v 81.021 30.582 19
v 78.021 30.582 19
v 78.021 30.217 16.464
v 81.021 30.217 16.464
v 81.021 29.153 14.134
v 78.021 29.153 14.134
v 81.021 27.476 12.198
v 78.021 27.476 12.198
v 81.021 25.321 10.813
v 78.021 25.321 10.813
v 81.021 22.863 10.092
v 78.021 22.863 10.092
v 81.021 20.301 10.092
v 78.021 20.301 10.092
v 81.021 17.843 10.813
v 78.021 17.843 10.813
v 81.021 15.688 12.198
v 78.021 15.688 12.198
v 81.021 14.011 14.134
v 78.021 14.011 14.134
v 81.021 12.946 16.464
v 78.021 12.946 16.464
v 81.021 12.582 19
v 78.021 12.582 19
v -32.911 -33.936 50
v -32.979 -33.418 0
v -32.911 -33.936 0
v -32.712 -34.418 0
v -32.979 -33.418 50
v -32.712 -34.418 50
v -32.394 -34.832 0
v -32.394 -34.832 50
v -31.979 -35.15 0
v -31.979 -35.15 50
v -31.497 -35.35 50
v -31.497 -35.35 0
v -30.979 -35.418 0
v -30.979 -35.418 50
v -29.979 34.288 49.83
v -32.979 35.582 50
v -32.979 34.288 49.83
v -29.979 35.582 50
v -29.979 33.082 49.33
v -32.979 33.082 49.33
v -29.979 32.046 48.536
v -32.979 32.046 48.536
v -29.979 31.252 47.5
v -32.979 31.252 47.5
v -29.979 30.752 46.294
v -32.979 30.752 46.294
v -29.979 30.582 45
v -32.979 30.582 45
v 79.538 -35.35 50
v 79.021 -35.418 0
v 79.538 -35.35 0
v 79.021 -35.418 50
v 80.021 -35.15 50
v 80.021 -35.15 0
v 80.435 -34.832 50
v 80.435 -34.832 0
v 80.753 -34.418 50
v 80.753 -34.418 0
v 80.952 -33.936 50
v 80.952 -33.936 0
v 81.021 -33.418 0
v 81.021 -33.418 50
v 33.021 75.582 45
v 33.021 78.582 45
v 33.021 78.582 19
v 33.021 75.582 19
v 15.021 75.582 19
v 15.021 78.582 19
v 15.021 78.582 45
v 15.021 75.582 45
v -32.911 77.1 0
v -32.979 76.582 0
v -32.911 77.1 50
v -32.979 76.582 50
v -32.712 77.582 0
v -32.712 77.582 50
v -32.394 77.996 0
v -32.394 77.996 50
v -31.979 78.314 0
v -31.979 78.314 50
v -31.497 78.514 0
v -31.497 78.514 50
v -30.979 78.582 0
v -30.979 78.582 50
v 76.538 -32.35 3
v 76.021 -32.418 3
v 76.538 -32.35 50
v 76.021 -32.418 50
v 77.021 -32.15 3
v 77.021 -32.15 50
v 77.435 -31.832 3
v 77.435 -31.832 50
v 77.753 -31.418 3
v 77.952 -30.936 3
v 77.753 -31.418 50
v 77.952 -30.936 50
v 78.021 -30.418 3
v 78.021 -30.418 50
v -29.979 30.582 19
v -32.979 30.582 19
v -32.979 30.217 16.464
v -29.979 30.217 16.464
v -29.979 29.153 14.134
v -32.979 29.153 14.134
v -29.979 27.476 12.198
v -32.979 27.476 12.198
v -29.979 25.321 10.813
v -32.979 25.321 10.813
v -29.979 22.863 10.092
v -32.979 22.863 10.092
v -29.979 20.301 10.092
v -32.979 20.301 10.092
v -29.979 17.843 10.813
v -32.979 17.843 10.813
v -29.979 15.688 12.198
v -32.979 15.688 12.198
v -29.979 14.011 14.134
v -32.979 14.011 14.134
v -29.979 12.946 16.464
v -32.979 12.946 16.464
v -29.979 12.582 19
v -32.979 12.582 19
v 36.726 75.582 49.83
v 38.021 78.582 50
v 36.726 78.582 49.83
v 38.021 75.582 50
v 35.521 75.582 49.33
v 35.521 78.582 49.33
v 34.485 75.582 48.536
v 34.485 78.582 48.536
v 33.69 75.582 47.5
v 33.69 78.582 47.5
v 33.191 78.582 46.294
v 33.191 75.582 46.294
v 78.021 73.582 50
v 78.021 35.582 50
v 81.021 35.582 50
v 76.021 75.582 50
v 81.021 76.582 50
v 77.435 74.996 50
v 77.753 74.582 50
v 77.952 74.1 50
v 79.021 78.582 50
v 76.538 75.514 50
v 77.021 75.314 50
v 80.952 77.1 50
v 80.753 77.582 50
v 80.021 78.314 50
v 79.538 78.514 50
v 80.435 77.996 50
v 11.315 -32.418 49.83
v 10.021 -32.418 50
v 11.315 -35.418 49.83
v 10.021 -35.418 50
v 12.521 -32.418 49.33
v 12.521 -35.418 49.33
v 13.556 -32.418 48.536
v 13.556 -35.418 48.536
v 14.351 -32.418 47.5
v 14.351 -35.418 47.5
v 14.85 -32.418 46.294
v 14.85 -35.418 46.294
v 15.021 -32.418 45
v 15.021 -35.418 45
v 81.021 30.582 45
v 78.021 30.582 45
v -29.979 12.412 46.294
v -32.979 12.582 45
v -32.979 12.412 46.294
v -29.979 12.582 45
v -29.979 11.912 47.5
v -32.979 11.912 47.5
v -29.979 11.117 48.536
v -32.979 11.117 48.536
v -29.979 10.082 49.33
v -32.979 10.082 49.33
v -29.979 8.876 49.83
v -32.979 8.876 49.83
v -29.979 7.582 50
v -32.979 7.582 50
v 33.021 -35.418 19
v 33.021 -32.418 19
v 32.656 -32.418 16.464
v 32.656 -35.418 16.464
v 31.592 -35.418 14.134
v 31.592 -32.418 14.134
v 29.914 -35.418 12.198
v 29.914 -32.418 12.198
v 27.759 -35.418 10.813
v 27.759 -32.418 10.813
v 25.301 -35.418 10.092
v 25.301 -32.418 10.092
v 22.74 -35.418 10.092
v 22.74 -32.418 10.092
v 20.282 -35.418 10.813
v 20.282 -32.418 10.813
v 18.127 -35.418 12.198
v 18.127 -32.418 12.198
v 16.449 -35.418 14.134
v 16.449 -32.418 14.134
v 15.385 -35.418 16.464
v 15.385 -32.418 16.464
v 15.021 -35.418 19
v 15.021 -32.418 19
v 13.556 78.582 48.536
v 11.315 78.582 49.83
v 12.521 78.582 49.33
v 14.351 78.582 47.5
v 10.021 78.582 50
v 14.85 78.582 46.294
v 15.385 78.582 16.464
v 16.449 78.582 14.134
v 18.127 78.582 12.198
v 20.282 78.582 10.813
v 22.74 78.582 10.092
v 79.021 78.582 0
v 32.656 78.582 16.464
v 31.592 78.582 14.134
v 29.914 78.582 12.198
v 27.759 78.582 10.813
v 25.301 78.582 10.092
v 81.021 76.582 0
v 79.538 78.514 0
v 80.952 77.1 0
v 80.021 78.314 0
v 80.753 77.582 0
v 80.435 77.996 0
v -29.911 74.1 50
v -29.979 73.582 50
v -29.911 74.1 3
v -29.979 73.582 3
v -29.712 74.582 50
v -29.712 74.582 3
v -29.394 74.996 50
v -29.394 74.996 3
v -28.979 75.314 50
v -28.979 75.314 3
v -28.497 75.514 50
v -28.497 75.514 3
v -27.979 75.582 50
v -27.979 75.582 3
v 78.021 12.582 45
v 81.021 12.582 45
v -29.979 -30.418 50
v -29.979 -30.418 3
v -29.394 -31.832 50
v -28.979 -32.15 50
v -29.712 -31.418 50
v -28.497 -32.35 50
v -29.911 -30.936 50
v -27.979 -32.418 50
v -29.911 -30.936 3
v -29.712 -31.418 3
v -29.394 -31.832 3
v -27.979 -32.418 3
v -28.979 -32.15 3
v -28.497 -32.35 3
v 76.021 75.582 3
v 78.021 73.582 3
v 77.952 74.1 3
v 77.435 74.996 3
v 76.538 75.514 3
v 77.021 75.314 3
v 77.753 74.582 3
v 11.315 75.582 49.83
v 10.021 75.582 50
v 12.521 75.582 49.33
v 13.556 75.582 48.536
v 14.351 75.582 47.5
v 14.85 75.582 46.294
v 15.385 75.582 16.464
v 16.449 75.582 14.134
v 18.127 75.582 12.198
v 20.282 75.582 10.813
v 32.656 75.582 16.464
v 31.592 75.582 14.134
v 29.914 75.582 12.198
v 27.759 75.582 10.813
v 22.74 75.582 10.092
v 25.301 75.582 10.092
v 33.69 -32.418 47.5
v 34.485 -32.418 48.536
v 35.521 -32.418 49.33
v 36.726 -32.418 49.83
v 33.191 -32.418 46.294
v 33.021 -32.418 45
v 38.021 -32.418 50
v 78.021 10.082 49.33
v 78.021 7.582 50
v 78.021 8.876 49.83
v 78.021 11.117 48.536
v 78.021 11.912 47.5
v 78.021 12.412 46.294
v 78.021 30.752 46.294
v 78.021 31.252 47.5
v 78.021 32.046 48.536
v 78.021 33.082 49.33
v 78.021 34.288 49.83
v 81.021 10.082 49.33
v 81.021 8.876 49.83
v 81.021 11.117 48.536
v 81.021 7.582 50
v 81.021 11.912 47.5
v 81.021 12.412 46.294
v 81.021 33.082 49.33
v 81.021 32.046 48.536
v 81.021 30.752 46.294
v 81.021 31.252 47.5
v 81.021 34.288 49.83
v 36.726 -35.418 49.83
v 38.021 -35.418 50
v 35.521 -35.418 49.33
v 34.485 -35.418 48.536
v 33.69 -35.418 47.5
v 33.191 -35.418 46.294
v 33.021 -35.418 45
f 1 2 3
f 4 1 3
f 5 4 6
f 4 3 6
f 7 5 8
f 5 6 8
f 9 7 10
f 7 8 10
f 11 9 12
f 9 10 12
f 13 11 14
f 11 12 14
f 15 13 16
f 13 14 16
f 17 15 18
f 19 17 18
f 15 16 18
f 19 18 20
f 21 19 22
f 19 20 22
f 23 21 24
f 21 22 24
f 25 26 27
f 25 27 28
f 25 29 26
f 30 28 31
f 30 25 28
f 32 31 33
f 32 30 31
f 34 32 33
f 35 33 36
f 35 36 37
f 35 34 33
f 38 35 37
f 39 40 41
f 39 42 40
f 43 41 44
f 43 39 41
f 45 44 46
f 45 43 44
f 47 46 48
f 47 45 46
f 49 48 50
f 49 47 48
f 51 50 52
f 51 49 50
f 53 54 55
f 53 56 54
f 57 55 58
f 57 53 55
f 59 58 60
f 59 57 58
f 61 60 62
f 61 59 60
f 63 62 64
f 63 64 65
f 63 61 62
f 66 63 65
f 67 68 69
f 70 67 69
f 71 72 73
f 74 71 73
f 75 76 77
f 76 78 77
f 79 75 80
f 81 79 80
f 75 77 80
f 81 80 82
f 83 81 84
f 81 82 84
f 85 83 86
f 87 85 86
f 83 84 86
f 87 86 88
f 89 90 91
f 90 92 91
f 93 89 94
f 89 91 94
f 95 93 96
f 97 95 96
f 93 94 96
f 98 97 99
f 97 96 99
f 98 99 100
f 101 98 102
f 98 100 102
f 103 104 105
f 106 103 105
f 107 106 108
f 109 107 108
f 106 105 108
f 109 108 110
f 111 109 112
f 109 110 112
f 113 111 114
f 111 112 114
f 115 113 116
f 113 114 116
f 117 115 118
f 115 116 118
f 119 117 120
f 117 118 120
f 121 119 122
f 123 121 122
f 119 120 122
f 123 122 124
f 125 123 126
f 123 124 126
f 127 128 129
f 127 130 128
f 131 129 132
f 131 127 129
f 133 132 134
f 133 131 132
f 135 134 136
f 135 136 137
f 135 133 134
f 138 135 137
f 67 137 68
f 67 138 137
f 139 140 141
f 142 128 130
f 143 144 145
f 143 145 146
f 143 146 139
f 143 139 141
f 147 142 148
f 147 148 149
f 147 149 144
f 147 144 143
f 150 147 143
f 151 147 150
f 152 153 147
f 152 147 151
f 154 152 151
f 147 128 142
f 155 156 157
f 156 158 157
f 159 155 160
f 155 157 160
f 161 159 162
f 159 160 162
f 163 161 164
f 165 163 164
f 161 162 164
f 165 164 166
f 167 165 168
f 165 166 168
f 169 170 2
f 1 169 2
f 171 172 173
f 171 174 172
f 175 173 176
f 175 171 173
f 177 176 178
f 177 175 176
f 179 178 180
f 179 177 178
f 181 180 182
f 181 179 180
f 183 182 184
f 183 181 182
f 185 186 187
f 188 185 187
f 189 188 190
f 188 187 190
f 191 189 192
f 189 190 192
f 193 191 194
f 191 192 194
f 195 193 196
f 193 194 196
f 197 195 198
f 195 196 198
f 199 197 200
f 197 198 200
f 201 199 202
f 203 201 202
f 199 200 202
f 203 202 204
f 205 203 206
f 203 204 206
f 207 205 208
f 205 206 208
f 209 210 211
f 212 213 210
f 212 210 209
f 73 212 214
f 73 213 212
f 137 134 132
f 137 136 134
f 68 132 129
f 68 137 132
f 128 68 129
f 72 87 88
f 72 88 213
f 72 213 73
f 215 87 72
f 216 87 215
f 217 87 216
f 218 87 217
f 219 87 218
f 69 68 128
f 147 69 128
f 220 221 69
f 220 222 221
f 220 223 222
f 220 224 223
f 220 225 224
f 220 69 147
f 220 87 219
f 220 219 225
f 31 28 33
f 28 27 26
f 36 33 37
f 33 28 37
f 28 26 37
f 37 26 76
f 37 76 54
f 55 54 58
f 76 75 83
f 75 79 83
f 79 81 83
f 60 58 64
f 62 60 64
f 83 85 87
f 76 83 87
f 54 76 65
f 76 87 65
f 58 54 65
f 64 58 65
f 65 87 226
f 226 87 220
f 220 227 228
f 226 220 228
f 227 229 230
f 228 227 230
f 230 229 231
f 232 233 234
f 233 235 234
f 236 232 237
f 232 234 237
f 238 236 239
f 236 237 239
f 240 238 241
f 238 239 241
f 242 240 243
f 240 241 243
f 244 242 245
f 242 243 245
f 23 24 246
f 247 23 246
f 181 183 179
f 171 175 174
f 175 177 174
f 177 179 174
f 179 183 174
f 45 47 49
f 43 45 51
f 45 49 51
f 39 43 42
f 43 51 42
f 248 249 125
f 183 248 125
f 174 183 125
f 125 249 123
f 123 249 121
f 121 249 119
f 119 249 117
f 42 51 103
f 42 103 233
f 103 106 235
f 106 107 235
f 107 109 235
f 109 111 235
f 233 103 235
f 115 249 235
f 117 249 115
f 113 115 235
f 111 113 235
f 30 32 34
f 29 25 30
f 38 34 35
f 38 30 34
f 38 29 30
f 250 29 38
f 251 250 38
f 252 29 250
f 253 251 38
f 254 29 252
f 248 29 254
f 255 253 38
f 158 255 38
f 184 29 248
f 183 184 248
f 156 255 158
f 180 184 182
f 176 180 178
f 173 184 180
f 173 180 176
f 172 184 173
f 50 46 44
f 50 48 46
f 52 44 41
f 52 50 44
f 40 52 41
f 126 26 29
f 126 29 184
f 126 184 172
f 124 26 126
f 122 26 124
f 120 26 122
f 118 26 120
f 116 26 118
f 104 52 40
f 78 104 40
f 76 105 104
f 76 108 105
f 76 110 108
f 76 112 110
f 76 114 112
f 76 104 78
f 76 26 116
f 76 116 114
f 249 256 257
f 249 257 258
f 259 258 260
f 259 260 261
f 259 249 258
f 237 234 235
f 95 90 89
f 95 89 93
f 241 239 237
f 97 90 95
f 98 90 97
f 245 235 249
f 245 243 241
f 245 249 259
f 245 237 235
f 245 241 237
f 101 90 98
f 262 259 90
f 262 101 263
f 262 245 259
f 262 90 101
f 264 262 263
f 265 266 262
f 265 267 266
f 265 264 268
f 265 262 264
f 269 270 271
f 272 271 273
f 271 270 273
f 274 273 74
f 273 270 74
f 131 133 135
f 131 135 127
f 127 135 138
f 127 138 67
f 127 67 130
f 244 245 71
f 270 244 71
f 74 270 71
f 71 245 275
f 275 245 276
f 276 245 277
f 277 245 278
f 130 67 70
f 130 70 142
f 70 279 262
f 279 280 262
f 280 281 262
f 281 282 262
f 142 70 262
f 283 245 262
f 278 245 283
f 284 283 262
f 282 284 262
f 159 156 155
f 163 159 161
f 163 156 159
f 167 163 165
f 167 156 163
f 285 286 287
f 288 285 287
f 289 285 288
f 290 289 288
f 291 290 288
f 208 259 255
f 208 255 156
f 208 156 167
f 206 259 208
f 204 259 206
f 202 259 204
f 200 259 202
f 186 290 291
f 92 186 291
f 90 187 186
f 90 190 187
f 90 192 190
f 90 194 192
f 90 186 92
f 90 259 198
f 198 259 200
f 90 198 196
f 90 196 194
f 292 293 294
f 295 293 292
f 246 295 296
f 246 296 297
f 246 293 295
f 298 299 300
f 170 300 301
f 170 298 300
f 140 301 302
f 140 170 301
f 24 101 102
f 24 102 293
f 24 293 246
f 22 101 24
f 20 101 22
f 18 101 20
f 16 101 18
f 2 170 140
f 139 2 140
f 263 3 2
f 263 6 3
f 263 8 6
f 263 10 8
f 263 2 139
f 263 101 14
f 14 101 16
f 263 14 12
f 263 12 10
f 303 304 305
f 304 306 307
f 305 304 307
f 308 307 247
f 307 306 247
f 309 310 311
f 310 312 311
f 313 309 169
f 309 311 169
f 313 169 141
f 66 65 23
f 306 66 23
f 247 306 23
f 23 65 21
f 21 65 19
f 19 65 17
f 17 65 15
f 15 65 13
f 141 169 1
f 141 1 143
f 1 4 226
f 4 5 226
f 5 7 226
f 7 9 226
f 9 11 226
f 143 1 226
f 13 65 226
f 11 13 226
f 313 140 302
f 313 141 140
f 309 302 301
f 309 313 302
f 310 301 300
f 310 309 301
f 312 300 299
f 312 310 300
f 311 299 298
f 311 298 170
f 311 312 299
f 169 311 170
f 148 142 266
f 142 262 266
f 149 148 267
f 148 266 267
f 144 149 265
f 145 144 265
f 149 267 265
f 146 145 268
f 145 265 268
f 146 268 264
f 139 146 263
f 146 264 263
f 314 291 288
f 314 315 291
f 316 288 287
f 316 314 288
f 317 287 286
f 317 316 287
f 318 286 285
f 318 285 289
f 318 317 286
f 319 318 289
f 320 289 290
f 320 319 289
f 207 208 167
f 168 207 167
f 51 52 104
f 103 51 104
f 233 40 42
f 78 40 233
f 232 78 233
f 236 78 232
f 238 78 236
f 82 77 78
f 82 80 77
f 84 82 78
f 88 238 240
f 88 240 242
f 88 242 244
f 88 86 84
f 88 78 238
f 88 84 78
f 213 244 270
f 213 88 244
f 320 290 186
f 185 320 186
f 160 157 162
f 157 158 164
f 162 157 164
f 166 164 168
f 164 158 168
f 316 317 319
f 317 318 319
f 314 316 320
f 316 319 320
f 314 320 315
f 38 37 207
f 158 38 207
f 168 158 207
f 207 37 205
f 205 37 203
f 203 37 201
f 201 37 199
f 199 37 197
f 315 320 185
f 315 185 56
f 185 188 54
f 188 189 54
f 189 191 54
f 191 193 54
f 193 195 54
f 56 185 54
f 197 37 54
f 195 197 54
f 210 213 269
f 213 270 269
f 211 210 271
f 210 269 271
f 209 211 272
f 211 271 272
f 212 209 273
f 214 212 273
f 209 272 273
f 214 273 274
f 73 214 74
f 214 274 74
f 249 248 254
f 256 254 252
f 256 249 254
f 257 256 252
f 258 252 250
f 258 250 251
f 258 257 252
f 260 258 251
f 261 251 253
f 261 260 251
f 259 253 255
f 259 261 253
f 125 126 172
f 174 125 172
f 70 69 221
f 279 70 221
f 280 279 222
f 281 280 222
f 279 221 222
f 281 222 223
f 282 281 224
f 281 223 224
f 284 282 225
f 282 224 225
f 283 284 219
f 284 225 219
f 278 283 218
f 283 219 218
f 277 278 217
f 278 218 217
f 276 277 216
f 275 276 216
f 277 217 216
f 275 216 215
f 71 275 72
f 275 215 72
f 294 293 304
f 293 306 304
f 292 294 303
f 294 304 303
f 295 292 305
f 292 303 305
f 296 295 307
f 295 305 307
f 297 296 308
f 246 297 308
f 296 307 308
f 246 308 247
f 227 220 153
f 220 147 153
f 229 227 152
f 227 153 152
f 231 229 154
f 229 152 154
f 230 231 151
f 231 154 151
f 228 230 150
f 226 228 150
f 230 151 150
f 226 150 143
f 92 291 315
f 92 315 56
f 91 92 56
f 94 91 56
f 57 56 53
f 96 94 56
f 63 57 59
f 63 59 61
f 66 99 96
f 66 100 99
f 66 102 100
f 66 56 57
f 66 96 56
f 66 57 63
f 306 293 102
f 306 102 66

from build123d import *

# Parameters (mm, degrees)
F0_W     = 114
F0_H     = 114
F1_DEPTH = 50
F2_T     = -3
F4_DEPTH = 114.001
F6_DEPTH = 114.001
F7_R     = 5
F8_R     = 2
F9_R     = 2


with BuildPart() as f1:
    # F0 (on Top) → F1 (new body)
    with BuildSketch(Plane.XY):
        with Locations((24.0205488801, 21.5819291472)):
            Rectangle(F0_W, F0_H)
    extrude(amount=F1_DEPTH)

    # F2
    f2_openings = [f1.faces().sort_by_distance(p)[0] for p in [
        (24.020549, 21.581929, 50),
    ]]
    offset(amount=F2_T, openings=f2_openings)

    # F3 (on face) → F4 (cut, through all)
    with BuildSketch(Plane(origin=(-32.9794511199, 0, 0), x_dir=(0, -1, 0), z_dir=(-1, 0, 0))):
        with BuildLine():
            Line((-12.5819291472, 19), (-12.5819291472, 50))
            Line((-12.5819291472, 50), (-30.5819291472, 50))
            Line((-30.5819291472, 50), (-30.5819291472, 19))
            ThreePointArc((-30.5819291472, 19), (-21.5819291472, 10), (-12.5819291472, 19))
        make_face()
    extrude(amount=-F4_DEPTH, mode=Mode.SUBTRACT)

    # F5 (on face) → F6 (cut, through all)
    with BuildSketch(Plane(origin=(0, 78.5819291472, 0), x_dir=(-1, 0, 0), z_dir=(0, 1, 0))):
        with BuildLine():
            Line((-33.0205488801, 50), (-33.0205488801, 19))
            ThreePointArc((-33.0205488801, 19), (-24.0205488801, 10), (-15.0205488801, 19))
            Line((-15.0205488801, 19), (-15.0205488801, 50))
            Line((-15.0205488801, 50), (-33.0205488801, 50))
        make_face()
    extrude(amount=-F6_DEPTH, mode=Mode.SUBTRACT)

    # F7
    f7_edges = [f1.edges().sort_by_distance(p)[0] for p in [
        (15.020549, 77.081929, 50),
        (15.020549, -33.918071, 50),
        (33.020549, 77.081929, 50),
        (33.020549, -33.918071, 50),
        (79.520549, 12.581929, 50),
        (-31.479451, 12.581929, 50),
        (79.520549, 30.581929, 50),
        (-31.479451, 30.581929, 50),
    ]]
    fillet(f7_edges, radius=F7_R)

    # F8
    f8_edges = [f1.edges().sort_by_distance(p)[0] for p in [
        (81.020549, -35.418071, 25),
        (-32.979451, -35.418071, 25),
        (-32.979451, 78.581929, 25),
        (81.020549, 78.581929, 25),
    ]]
    fillet(f8_edges, radius=F8_R)

    # F9
    f9_edges = [f1.edges().sort_by_distance(p)[0] for p in [
        (-29.979451, -32.418071, 26.5),
        (-29.979451, 75.581929, 26.5),
        (78.020549, 75.581929, 26.5),
        (78.020549, -32.418071, 26.5),
    ]]
    fillet(f9_edges, radius=F9_R)


solid = f1.part
